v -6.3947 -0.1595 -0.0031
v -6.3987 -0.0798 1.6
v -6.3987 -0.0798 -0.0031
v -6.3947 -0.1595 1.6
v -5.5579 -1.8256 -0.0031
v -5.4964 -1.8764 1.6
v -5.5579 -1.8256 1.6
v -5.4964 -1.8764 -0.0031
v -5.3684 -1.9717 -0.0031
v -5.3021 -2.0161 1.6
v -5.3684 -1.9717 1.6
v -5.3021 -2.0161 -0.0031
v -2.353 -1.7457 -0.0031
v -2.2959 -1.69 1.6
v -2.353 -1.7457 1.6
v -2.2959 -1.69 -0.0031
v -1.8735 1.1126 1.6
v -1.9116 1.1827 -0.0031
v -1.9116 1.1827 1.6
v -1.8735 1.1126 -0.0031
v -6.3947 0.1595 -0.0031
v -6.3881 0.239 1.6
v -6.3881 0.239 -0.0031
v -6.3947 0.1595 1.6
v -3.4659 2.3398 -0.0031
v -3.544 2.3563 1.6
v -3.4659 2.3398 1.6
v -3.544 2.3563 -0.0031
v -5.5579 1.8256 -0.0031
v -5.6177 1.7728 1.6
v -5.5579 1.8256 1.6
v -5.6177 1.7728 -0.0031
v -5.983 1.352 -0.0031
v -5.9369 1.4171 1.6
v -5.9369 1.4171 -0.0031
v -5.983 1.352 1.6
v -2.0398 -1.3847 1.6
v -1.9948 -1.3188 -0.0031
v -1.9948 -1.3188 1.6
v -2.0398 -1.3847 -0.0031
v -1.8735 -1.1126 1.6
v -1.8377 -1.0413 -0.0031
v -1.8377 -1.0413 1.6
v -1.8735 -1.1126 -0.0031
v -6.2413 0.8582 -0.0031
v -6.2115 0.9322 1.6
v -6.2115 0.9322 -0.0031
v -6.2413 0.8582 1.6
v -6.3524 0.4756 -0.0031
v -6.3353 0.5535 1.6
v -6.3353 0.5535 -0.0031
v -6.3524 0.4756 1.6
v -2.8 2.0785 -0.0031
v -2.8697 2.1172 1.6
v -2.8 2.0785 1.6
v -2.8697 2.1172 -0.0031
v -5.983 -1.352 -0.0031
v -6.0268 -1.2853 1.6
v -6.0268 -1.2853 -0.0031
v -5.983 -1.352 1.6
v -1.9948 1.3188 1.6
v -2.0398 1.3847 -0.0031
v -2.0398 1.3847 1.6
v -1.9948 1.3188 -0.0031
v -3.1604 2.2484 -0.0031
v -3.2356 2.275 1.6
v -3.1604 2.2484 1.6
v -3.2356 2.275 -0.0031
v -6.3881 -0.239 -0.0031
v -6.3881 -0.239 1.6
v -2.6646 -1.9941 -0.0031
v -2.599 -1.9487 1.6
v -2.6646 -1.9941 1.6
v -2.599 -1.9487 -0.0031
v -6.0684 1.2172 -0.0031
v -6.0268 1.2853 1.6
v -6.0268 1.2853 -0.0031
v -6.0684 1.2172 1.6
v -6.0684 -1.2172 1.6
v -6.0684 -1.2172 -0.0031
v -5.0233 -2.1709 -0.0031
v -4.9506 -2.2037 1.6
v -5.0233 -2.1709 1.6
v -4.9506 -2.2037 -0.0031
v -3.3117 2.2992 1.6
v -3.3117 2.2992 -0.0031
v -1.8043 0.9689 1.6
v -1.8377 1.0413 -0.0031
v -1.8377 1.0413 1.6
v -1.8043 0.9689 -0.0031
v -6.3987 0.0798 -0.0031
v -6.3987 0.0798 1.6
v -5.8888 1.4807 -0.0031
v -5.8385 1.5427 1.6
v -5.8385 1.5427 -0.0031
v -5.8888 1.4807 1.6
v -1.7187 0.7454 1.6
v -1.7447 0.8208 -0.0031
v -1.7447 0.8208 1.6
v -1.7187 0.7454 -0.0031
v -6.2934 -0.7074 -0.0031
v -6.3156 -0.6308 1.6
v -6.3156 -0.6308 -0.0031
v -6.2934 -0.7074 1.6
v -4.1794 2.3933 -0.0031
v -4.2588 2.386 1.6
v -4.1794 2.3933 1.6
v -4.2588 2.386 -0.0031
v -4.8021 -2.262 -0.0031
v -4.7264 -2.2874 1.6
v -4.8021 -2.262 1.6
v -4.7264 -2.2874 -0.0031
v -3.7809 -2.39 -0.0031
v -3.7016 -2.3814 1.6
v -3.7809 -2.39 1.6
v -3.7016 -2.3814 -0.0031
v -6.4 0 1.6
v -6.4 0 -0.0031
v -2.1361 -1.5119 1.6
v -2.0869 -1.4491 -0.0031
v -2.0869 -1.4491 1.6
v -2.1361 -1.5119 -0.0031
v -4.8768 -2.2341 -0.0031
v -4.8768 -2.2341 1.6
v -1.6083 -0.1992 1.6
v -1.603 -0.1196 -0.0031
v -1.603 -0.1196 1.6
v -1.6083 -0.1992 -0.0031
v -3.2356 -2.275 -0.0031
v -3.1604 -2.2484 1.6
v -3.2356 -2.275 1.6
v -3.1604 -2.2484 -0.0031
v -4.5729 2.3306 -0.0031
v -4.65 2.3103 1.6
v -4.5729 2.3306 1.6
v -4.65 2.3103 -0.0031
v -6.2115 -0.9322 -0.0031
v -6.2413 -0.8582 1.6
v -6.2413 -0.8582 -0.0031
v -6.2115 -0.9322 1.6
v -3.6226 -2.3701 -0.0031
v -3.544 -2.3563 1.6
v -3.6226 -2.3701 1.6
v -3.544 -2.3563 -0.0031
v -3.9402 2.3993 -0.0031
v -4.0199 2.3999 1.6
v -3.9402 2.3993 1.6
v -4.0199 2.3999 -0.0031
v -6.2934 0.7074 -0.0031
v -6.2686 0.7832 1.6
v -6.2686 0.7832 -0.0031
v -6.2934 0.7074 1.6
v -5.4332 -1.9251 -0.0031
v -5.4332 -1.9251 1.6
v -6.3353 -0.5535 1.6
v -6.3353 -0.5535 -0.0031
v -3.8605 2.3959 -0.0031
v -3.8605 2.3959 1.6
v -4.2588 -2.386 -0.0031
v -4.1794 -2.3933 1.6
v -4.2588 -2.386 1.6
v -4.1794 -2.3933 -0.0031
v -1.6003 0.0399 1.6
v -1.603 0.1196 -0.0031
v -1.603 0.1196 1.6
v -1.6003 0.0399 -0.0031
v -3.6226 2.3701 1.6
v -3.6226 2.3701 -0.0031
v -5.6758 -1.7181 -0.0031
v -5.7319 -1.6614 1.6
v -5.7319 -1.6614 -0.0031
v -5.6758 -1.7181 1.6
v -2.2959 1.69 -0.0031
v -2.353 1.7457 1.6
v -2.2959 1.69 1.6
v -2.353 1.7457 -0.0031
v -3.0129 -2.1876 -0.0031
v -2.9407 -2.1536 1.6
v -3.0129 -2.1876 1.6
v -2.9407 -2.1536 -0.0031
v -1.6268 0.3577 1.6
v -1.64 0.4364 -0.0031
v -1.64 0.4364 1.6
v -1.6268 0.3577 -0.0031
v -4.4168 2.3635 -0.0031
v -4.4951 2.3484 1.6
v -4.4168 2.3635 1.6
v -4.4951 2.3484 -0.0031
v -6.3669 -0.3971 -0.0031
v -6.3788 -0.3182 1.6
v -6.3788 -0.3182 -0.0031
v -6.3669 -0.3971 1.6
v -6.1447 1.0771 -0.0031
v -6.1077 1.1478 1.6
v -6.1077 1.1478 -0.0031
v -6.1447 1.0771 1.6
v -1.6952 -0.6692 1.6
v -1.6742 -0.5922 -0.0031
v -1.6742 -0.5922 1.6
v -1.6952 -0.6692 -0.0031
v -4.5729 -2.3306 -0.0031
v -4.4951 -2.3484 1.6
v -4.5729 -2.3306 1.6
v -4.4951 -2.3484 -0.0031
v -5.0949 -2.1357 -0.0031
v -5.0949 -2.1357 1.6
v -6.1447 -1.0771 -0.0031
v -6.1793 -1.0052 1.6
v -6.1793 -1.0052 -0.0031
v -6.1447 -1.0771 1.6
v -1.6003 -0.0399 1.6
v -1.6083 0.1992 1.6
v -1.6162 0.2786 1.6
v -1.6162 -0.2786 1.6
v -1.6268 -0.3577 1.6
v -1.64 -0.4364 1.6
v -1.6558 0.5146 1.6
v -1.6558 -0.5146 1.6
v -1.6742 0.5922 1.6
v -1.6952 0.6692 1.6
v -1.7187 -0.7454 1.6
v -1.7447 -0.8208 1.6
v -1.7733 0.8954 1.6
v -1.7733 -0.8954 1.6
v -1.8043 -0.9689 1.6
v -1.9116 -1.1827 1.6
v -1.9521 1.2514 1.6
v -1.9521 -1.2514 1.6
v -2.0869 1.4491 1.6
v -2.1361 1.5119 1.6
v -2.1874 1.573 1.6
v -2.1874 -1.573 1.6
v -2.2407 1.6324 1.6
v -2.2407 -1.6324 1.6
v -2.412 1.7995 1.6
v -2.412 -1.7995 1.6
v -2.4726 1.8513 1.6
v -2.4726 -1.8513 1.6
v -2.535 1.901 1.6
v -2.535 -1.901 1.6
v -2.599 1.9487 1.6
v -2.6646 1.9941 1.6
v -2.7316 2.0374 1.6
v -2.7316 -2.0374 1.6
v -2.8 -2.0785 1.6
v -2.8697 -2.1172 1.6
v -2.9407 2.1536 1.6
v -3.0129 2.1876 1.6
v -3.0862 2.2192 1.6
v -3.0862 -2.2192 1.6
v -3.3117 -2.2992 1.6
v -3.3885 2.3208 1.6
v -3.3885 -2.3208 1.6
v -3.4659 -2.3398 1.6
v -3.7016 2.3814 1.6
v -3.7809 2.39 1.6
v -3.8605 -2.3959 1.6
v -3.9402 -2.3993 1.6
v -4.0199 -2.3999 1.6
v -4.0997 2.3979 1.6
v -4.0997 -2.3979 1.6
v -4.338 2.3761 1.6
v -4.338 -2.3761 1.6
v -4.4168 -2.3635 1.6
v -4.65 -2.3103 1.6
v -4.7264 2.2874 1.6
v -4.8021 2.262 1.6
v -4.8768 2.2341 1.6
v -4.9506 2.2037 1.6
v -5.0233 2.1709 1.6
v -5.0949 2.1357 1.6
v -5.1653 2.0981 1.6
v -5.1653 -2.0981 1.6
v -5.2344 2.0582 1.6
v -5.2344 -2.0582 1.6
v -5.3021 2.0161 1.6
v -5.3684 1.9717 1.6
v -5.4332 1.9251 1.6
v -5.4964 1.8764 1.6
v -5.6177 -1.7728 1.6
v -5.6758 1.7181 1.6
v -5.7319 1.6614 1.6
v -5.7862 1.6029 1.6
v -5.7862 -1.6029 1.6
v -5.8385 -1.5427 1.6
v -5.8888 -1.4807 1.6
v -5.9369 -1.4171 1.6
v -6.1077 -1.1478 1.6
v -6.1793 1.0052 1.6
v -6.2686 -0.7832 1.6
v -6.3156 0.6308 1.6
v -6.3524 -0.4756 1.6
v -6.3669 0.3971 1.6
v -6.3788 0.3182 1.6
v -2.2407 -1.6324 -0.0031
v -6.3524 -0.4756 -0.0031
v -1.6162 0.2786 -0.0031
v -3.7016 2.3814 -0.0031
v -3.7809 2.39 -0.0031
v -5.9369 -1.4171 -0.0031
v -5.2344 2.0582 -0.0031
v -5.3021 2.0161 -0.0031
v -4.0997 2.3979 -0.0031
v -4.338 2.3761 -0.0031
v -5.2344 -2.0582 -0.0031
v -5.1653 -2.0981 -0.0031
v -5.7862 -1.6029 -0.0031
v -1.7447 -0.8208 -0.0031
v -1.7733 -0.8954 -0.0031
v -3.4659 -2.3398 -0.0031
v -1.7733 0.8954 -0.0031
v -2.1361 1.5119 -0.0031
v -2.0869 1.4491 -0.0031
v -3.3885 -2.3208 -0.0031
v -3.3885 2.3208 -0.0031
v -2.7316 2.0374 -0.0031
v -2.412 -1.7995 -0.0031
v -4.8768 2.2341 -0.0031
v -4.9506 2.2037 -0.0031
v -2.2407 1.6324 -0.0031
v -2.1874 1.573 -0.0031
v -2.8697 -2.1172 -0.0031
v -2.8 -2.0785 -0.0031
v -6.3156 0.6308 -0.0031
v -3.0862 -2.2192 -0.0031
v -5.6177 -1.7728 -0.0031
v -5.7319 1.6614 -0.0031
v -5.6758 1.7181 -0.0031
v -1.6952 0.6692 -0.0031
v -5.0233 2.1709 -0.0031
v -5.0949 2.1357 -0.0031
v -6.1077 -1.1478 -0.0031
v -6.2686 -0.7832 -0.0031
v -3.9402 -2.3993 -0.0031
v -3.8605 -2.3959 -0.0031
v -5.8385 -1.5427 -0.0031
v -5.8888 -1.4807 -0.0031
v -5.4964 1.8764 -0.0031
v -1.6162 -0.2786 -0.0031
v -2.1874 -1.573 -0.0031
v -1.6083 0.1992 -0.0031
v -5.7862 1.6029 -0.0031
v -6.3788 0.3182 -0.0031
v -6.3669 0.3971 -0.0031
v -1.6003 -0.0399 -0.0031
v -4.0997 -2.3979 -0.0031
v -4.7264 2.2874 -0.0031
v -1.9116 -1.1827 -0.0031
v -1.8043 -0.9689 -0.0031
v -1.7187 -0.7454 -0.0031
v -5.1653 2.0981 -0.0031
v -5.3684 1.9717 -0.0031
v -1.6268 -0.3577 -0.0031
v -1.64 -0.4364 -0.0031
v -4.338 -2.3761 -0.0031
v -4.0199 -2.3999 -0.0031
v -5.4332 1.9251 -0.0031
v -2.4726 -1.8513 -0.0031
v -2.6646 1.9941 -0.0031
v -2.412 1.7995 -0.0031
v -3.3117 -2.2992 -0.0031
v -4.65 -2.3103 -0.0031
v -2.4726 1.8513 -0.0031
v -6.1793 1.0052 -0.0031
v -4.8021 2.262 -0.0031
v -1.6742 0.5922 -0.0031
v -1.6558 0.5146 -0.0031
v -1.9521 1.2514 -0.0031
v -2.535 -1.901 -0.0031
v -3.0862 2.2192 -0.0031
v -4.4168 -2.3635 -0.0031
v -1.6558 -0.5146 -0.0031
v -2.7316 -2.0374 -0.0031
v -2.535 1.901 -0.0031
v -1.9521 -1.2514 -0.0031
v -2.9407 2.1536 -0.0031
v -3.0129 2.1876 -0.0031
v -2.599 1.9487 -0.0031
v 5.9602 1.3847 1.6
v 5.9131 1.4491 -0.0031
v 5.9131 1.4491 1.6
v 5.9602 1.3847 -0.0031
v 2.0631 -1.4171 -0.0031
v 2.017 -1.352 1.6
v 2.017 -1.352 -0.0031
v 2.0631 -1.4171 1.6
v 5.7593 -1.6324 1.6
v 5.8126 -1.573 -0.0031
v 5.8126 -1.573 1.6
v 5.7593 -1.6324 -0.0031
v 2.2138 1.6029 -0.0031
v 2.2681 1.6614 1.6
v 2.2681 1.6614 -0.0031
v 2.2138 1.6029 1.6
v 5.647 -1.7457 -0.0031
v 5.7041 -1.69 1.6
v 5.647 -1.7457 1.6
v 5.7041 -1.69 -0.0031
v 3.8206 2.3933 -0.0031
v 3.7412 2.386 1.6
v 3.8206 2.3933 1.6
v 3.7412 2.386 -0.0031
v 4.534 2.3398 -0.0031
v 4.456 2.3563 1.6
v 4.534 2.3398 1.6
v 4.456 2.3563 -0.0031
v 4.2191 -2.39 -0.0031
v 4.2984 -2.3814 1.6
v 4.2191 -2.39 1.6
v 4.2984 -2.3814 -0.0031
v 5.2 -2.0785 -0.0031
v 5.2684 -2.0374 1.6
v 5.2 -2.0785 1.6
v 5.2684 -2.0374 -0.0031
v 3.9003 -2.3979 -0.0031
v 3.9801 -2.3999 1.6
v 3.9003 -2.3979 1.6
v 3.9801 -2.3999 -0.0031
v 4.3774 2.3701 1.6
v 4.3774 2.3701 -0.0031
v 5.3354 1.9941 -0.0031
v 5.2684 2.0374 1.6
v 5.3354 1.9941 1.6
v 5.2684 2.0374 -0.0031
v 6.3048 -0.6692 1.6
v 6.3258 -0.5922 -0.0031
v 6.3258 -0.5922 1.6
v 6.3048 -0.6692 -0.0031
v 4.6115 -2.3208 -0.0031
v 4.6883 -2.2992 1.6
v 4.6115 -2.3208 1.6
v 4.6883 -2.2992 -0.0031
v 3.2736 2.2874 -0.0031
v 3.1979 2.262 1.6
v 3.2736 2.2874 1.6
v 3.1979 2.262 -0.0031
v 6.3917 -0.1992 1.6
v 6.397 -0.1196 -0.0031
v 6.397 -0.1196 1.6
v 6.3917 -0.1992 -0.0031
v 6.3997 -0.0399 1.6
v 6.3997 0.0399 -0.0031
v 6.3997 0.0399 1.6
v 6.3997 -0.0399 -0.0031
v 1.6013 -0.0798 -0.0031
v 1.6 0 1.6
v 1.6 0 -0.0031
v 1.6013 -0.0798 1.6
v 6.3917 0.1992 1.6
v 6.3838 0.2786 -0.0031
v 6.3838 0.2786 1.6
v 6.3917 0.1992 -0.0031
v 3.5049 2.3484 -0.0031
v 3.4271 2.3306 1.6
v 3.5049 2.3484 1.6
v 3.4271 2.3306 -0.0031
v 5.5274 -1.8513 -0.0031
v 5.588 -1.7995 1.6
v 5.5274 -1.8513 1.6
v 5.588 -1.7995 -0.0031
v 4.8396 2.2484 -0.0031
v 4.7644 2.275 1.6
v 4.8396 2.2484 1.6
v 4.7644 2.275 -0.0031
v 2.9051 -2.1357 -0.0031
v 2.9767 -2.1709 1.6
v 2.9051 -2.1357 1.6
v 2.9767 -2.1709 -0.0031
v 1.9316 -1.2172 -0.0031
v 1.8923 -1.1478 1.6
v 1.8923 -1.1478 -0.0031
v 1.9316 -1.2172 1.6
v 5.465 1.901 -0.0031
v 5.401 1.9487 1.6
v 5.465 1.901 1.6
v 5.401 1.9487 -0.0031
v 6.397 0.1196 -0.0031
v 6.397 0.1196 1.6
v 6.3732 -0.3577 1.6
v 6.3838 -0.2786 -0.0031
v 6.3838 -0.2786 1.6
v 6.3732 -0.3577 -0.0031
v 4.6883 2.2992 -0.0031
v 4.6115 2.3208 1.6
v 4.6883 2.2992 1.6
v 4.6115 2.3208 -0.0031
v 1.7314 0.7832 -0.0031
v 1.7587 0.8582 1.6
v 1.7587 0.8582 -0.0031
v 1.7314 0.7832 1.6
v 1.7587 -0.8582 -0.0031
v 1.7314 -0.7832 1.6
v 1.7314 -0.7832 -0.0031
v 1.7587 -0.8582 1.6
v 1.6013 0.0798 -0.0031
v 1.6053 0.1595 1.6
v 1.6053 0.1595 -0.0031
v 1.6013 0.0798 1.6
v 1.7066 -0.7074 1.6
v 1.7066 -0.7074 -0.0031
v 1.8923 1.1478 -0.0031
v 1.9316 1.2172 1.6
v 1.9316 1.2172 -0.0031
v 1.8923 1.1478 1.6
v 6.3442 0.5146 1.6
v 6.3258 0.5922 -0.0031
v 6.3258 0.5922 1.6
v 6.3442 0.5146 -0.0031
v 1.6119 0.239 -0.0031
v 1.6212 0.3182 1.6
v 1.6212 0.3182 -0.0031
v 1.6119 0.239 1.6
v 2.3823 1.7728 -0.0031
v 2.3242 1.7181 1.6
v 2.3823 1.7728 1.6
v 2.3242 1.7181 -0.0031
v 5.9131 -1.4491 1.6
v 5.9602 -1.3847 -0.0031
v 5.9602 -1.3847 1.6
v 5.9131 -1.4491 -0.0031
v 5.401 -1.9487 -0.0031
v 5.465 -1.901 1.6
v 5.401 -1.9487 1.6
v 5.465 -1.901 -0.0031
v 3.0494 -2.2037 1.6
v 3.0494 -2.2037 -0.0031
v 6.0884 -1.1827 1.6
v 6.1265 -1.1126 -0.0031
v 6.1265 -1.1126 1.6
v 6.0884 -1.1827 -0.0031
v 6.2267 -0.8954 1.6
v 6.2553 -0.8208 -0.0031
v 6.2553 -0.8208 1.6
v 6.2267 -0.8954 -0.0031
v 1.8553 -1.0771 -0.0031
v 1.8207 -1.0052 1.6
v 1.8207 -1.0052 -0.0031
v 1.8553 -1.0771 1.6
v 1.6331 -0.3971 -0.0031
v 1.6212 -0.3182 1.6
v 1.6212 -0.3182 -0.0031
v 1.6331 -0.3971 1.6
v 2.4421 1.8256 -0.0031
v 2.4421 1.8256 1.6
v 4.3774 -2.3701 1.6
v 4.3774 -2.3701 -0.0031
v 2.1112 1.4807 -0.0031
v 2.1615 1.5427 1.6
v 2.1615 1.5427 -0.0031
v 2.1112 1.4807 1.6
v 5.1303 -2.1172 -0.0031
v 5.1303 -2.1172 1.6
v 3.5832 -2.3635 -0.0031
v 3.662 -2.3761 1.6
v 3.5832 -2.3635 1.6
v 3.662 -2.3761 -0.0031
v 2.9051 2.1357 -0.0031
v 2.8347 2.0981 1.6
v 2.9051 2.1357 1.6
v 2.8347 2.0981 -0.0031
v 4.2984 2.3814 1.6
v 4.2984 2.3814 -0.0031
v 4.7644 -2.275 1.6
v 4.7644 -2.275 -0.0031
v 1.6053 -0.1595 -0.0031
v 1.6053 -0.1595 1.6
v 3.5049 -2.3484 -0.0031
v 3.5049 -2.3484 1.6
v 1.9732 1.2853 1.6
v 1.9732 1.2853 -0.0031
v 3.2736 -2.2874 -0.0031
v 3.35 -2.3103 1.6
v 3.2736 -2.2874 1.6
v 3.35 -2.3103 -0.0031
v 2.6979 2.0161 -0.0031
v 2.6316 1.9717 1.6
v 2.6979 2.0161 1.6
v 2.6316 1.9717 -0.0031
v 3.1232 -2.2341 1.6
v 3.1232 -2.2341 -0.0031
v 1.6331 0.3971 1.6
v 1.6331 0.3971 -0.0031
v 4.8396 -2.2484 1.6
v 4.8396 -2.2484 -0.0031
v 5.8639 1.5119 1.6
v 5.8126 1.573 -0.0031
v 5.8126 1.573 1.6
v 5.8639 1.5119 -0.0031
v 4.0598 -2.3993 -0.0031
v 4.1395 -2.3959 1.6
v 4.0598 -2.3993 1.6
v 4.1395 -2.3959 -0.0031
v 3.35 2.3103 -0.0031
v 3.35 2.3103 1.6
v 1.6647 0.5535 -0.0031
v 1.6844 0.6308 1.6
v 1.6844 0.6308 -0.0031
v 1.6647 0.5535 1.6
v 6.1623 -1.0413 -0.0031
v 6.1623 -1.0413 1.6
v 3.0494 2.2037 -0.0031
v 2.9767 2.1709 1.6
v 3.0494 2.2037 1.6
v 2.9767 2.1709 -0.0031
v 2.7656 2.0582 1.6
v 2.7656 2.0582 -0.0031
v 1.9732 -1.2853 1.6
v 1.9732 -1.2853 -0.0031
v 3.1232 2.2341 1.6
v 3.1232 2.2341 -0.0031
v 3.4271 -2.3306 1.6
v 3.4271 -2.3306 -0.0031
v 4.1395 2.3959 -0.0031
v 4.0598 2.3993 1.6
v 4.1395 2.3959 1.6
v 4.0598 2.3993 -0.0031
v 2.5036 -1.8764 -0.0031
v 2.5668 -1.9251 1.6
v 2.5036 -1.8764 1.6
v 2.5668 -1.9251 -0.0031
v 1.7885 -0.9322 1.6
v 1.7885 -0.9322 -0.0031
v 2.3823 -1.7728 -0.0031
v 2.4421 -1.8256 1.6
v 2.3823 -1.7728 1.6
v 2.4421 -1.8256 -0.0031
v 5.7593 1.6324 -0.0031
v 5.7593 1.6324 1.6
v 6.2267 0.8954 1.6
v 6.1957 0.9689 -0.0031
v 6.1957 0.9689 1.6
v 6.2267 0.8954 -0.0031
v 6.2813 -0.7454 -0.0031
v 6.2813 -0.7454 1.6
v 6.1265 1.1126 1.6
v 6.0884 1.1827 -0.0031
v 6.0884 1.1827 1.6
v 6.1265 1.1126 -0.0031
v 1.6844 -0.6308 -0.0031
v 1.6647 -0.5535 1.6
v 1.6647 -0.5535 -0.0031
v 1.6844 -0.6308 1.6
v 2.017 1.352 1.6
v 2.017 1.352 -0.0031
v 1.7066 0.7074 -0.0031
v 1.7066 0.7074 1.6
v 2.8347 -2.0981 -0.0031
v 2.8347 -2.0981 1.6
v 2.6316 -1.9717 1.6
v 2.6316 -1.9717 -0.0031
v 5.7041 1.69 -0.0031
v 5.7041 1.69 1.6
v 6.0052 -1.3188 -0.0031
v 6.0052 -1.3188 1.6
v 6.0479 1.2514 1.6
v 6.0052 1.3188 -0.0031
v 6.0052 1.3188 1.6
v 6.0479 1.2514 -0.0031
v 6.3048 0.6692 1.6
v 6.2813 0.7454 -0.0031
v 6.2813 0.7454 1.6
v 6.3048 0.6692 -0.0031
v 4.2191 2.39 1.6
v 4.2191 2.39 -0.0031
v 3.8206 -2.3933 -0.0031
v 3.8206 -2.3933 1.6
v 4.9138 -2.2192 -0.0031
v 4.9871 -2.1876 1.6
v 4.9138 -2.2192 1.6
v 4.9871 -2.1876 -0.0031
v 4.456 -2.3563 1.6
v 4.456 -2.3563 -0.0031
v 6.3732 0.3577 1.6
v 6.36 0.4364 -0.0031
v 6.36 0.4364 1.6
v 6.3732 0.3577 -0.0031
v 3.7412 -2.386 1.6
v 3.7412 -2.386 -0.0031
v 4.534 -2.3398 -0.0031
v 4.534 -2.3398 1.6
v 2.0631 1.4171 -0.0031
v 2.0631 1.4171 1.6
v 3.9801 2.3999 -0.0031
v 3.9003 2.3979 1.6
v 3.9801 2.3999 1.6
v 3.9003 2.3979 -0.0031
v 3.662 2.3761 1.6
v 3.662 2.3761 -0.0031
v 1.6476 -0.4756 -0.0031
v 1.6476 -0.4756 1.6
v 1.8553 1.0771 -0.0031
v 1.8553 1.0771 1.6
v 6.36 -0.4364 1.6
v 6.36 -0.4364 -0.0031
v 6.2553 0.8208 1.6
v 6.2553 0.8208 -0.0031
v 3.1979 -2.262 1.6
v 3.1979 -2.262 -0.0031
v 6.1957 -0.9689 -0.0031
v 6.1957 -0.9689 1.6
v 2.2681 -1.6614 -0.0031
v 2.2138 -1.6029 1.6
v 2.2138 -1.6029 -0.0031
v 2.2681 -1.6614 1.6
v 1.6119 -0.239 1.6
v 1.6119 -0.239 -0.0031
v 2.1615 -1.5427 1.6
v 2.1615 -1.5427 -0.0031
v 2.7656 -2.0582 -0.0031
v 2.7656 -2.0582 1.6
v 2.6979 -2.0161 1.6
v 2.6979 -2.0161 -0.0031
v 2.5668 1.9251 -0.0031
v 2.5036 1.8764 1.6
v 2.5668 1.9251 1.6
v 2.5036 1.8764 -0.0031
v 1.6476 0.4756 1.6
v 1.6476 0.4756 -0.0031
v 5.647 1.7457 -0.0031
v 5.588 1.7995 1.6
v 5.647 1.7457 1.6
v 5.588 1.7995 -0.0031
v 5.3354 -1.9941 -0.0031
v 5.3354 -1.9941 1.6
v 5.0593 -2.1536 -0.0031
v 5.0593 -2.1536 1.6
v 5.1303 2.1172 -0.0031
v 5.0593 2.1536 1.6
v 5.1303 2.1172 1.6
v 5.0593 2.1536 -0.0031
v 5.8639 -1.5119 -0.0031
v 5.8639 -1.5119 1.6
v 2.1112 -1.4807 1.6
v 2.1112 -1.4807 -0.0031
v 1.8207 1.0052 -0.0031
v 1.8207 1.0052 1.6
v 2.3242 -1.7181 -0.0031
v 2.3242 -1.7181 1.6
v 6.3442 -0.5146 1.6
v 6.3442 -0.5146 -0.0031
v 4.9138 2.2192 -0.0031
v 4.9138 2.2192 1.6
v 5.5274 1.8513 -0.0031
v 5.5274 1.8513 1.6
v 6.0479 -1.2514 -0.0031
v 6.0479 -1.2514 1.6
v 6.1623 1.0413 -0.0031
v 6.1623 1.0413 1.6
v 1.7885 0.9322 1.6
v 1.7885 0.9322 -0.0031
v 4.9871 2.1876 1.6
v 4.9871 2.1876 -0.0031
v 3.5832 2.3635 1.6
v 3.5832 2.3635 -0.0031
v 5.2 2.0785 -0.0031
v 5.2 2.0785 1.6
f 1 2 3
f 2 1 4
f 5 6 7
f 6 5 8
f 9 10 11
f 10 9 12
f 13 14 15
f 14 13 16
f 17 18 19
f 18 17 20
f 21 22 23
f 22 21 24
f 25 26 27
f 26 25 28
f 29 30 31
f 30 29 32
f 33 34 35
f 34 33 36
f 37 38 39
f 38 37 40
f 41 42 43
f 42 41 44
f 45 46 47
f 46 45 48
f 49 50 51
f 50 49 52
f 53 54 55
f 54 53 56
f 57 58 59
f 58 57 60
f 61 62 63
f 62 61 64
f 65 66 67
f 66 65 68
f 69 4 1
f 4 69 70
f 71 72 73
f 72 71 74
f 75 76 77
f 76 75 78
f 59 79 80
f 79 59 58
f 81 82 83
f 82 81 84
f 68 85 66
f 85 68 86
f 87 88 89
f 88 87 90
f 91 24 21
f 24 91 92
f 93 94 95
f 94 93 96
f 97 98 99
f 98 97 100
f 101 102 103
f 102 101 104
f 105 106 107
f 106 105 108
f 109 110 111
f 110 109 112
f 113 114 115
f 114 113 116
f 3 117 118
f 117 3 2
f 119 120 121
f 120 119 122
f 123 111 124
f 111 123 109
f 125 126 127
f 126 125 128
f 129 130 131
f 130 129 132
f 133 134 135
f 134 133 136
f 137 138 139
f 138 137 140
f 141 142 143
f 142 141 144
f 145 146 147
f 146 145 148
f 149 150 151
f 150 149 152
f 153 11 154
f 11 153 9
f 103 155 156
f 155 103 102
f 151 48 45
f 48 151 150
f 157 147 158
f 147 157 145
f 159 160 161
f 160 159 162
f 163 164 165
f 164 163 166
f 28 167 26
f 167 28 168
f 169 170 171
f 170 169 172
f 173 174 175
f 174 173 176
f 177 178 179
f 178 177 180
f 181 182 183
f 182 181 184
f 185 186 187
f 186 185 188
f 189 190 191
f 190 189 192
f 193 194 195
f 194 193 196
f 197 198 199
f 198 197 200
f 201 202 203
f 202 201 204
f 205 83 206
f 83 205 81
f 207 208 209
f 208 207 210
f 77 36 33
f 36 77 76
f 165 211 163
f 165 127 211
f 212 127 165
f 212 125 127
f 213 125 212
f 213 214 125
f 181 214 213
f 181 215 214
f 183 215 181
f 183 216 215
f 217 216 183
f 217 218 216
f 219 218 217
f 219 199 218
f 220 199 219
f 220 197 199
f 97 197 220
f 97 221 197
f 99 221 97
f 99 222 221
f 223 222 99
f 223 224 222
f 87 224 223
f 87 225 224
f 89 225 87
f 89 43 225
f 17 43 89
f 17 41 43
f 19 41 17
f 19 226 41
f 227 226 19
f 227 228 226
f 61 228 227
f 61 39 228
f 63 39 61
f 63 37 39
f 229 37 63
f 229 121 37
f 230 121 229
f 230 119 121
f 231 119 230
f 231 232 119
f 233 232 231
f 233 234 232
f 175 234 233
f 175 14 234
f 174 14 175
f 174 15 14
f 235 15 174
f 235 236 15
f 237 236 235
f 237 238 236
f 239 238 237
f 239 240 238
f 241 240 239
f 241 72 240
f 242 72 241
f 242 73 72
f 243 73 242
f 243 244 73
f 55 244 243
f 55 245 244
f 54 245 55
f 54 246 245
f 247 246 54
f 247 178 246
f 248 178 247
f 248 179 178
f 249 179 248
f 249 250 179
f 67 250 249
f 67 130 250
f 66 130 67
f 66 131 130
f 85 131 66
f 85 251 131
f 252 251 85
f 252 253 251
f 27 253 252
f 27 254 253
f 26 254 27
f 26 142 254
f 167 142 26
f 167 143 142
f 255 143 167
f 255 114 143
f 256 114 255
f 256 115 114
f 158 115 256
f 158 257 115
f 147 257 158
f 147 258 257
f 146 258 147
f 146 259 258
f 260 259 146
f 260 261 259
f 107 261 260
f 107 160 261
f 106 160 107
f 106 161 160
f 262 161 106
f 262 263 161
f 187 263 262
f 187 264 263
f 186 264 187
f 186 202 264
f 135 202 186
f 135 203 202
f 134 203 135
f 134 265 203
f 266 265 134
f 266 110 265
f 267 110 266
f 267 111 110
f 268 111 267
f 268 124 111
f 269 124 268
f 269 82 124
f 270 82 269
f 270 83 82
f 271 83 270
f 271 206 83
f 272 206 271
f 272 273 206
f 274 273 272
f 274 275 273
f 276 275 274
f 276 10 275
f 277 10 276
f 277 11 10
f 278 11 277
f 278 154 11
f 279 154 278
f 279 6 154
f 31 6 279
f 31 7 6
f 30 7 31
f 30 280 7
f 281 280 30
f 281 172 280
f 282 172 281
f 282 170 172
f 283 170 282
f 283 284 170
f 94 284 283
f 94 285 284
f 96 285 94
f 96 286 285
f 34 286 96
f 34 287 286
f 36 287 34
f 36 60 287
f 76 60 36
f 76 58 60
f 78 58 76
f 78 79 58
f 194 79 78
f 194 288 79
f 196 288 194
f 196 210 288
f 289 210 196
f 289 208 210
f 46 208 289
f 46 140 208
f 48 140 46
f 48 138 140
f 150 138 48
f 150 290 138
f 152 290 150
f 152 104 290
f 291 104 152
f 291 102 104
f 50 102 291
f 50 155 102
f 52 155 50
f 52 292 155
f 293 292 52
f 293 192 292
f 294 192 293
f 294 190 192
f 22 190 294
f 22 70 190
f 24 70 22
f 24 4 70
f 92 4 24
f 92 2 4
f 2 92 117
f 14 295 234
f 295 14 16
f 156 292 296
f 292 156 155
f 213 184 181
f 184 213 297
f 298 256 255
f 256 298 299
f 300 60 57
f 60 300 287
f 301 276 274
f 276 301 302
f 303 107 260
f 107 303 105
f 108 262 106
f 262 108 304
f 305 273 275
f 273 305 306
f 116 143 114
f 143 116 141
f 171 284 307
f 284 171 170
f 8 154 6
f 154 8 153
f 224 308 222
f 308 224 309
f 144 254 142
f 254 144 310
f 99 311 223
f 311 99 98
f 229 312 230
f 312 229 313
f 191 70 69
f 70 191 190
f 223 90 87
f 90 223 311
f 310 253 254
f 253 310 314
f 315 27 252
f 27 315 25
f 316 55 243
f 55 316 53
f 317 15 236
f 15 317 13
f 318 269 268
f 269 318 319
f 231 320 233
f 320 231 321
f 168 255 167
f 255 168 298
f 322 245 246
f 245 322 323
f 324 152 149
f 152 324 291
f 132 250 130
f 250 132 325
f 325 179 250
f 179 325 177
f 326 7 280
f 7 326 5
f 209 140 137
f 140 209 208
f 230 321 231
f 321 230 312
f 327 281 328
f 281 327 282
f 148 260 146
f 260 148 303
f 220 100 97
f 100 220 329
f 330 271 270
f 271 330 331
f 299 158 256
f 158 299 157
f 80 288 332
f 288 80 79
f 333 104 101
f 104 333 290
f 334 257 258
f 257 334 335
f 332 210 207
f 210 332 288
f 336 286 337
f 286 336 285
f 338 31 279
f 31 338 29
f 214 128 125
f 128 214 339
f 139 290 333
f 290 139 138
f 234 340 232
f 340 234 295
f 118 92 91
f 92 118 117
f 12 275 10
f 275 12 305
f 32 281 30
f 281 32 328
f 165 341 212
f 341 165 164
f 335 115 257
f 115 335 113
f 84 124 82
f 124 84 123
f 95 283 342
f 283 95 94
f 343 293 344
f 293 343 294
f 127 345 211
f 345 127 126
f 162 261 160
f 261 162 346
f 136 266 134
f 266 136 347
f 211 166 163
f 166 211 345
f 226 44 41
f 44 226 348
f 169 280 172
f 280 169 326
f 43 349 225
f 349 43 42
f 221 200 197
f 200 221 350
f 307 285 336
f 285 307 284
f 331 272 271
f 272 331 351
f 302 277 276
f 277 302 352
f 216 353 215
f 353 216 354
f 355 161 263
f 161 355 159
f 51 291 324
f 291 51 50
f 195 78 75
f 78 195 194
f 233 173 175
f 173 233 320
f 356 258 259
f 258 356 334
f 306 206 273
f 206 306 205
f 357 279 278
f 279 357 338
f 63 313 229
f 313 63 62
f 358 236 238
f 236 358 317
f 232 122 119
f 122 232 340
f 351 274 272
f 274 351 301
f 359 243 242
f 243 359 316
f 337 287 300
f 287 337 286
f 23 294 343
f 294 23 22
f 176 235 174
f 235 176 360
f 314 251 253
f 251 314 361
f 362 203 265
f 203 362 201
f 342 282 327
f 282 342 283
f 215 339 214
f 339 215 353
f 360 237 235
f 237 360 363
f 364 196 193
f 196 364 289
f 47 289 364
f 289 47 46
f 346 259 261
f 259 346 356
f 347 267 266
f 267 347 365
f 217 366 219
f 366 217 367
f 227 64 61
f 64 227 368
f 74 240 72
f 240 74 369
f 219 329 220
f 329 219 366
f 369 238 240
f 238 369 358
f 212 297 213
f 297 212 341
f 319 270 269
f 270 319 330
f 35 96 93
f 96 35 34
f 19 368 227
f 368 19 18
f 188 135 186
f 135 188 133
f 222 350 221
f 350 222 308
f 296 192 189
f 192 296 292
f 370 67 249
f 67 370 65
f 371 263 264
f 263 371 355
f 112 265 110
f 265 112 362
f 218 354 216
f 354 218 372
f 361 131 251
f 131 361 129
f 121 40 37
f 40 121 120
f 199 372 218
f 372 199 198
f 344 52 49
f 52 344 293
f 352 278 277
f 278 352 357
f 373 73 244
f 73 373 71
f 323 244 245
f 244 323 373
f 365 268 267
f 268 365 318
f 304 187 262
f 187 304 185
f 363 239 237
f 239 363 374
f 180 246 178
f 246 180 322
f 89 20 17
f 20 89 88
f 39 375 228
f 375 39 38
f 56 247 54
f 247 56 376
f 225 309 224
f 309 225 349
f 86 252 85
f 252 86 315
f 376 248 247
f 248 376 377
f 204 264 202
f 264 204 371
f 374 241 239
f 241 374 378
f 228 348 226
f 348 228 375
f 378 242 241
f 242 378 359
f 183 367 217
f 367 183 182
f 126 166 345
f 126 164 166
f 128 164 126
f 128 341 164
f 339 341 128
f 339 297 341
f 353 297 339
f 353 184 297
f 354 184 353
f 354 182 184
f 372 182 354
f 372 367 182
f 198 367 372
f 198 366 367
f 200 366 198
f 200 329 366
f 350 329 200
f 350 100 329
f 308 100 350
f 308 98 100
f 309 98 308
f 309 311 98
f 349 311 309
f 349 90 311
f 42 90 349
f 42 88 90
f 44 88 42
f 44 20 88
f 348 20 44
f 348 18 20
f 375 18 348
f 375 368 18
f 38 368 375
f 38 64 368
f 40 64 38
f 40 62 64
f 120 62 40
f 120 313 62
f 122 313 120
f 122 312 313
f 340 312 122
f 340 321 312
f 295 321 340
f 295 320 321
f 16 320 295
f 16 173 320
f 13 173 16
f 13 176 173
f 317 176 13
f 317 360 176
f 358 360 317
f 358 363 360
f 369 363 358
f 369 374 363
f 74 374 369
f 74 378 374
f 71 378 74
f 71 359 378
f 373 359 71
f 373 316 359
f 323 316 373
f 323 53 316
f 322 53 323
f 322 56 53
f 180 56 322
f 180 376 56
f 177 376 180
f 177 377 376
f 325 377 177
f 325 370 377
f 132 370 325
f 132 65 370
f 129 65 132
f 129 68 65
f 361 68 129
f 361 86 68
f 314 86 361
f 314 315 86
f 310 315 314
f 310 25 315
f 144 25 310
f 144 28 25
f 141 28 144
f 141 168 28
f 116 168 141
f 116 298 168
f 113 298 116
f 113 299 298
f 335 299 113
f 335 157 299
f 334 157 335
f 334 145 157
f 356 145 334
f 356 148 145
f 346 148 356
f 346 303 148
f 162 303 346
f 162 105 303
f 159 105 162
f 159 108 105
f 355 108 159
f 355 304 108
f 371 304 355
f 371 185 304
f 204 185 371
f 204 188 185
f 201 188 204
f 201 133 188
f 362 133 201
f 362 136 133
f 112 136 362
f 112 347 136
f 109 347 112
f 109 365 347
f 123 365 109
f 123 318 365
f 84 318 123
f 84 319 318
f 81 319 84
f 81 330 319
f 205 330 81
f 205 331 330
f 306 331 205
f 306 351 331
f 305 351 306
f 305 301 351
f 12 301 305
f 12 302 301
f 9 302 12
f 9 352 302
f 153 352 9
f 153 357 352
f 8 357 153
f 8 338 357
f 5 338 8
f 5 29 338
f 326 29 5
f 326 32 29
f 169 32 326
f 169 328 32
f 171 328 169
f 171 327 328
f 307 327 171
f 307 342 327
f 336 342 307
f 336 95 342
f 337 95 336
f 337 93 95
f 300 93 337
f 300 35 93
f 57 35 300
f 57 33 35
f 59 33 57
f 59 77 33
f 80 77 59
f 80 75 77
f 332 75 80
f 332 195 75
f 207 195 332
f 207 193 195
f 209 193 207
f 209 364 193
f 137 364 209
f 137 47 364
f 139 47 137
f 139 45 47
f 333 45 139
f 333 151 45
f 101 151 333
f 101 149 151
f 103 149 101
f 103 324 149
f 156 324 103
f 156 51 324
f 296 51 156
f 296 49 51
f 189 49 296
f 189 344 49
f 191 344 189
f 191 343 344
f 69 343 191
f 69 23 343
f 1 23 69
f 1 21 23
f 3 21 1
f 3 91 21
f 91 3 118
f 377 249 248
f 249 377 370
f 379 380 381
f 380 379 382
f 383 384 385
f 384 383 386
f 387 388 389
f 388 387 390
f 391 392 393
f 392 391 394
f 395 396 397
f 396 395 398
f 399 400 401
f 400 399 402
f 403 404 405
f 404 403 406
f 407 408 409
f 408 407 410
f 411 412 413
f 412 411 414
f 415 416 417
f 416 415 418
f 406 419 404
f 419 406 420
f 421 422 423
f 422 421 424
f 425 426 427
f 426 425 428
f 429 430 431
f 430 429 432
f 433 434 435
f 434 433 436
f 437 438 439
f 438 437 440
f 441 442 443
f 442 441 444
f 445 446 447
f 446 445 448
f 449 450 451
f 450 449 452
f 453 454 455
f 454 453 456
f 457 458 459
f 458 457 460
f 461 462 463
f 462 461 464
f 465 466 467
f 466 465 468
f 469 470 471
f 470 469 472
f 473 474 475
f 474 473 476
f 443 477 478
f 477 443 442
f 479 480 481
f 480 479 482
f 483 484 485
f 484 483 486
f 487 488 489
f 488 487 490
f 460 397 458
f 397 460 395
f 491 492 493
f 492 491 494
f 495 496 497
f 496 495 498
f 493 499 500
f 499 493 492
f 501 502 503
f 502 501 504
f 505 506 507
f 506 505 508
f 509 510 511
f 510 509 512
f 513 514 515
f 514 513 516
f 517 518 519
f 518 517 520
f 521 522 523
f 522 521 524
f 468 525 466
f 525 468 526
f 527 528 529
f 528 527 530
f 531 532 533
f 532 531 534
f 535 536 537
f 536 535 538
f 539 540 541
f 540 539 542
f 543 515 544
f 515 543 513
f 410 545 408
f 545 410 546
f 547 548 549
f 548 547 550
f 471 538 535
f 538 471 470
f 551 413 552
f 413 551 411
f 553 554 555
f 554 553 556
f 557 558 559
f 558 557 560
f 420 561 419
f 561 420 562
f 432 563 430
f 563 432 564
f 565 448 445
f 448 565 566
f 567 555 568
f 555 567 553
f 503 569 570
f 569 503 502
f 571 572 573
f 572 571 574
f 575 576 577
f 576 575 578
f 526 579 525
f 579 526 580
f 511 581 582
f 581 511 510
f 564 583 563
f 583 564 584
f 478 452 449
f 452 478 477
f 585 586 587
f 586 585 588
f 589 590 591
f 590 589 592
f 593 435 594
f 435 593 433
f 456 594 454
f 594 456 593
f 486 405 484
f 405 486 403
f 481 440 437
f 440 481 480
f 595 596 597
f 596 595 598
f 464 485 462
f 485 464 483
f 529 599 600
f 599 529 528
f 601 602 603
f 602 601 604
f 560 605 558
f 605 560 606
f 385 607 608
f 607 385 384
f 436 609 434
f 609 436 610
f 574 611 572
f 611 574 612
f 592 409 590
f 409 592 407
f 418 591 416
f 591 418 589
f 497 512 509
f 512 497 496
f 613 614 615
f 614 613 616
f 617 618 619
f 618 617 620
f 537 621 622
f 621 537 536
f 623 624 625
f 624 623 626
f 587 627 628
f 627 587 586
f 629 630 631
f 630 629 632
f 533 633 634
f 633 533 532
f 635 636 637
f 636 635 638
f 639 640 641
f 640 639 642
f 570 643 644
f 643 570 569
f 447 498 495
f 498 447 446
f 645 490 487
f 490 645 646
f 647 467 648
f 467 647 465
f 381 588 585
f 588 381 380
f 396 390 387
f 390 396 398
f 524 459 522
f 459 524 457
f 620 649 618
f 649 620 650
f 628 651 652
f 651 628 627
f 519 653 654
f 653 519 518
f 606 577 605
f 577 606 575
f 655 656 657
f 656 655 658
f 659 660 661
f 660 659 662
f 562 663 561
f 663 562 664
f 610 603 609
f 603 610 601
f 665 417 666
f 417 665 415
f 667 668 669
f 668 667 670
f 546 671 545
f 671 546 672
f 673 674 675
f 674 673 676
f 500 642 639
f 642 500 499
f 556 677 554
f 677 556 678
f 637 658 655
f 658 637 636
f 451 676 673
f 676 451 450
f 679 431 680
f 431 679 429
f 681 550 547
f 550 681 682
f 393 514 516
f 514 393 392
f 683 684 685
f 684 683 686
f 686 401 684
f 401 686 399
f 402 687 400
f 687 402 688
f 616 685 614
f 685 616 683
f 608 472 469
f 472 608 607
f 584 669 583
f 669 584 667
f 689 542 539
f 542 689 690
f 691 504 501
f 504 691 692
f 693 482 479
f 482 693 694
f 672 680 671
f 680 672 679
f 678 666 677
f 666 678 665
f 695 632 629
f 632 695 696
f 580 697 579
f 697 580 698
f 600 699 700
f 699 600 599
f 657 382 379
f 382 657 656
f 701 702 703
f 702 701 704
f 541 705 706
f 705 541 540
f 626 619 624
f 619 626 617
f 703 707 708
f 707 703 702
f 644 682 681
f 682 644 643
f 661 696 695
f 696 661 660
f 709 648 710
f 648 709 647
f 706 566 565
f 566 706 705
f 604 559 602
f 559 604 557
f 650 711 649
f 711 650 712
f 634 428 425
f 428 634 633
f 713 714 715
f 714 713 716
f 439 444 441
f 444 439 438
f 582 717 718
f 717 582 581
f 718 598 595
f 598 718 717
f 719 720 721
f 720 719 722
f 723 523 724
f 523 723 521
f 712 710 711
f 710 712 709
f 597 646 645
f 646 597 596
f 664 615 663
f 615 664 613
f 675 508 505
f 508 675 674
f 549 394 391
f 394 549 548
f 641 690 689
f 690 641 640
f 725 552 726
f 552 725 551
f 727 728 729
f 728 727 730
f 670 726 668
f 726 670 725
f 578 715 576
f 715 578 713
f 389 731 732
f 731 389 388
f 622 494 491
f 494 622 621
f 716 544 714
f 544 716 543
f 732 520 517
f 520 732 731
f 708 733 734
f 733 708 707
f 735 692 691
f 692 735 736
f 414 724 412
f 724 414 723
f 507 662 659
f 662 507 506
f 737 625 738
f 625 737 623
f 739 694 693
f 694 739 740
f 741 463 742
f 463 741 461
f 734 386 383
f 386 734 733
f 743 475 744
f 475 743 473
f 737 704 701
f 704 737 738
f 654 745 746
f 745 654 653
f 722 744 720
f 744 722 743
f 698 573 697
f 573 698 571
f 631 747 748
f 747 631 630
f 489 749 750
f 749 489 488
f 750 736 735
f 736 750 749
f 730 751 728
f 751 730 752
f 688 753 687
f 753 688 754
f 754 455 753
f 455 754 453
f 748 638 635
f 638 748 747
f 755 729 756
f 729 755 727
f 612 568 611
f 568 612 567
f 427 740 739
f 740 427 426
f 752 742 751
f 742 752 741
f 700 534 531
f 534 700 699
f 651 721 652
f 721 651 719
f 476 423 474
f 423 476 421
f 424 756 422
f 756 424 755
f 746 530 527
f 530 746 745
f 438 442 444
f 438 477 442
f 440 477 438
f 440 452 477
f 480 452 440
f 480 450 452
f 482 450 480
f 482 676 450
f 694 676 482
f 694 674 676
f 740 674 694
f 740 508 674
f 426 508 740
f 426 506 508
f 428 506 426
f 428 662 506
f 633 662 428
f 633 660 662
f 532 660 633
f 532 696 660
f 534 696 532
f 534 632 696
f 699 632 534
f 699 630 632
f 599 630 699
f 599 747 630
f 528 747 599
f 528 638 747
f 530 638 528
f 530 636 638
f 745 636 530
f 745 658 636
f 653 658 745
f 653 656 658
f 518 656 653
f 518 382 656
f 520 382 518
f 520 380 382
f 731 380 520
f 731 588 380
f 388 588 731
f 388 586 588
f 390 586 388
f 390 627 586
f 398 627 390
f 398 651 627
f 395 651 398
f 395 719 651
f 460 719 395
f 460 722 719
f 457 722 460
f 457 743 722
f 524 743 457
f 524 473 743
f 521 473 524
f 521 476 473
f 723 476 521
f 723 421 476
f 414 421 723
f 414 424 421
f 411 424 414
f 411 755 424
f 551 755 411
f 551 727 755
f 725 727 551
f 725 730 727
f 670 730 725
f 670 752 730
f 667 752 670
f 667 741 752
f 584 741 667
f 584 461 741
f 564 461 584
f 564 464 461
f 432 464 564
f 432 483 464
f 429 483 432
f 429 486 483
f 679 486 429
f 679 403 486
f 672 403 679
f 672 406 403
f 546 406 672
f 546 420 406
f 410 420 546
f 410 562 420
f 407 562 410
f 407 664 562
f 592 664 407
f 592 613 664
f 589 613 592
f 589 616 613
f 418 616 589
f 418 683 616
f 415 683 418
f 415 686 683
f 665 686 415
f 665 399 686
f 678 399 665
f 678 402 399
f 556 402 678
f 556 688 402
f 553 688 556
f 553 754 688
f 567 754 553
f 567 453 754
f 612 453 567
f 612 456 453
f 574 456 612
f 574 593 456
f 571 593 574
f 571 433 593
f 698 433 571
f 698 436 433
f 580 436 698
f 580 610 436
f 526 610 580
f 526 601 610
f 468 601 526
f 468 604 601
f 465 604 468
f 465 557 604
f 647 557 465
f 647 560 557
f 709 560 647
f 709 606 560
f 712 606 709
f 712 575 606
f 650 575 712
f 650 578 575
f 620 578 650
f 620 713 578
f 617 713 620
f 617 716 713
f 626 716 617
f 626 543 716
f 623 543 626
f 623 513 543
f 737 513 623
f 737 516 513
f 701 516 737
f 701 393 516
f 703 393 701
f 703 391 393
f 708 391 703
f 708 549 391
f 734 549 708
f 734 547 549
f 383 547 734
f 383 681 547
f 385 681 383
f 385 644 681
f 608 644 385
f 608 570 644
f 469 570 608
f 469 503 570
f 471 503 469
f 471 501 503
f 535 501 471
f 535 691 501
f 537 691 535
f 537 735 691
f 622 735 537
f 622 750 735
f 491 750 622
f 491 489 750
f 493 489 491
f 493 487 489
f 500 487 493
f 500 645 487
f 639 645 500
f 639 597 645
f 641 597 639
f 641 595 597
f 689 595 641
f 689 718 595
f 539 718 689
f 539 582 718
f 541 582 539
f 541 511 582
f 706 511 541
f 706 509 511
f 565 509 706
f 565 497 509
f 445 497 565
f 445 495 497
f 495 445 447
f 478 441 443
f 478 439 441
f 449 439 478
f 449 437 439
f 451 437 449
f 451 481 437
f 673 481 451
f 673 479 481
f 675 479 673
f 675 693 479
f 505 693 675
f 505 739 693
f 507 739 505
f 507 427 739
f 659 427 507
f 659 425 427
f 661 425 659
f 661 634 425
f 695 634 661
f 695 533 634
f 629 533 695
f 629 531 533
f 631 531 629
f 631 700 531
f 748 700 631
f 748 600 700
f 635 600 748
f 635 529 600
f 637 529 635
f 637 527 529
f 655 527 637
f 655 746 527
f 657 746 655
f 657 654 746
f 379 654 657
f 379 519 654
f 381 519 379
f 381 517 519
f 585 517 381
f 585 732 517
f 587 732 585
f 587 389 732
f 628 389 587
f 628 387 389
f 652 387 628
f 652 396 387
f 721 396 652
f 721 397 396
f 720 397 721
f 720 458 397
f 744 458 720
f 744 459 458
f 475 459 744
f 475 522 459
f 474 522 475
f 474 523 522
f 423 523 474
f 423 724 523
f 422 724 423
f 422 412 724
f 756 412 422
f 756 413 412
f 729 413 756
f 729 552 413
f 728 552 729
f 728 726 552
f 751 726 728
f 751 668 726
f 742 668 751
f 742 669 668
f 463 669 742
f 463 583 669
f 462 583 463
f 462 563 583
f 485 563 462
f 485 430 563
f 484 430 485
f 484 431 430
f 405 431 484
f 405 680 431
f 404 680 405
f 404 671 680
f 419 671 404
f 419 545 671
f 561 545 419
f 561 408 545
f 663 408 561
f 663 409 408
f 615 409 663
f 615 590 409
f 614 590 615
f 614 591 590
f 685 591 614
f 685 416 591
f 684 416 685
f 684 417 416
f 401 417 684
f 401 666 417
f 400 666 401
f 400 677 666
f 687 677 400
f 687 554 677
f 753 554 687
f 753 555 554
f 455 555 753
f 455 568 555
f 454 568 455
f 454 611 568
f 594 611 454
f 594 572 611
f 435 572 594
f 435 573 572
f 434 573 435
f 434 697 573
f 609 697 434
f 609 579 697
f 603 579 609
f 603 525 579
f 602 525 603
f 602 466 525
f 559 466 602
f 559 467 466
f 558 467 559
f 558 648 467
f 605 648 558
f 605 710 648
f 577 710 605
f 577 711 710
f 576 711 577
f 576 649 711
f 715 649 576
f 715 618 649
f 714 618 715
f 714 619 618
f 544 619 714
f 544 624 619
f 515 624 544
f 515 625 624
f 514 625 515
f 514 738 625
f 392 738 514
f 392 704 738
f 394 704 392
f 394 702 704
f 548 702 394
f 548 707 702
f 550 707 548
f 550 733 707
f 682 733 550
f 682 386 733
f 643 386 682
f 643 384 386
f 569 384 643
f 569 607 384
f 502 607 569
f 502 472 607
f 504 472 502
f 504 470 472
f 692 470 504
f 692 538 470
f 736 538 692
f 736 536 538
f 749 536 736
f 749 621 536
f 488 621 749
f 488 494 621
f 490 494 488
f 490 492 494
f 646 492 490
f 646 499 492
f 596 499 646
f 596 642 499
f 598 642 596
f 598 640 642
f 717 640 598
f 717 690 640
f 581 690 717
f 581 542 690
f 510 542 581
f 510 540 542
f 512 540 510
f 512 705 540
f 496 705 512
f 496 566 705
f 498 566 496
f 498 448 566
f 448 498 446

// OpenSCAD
use <../lib.scad>
use <s/3004p90a.scad>
use <s/3004p90b.scad>
use <s/30363s01.scad>
$fa=1; $fs=0.2;
function ldraw_lib__30363p90(realsolid=false) = [
// 0 Slope Brick 18  4 x  2 with Classic Space Pattern
// 0 Name: 30363p90.dat
// 0 Author: Massimo Maso [Sirio]
// 0 !LDRAW_ORG Part UPDATE 2014-02
// 0 !LICENSE Licensed under CC BY 2.0 and CC BY 4.0 : see CAreadme.txt
// 
// 0 BFC CERTIFY CCW
  [0,"BFC","CERTIFY"],
  [0,"BFC","CCW"],
// 
// 0 !HISTORY 2014-12-23 [PTadmin] Official Update 2014-02
// 
// 
// 1 16 0 0 0 1 0 0 0 1 0 0 0 1 s\30363s01.dat
  [1,16,0,0,0,1,0,0,0,1,0,0,0,1, ldraw_lib__s__30363s01(realsolid)],
// 1 16 0 6.205 -28.616 1 0 0 0 0.316228 0.948684 0 -0.948684 0.316227 s\3004p90a.dat
  [1,16,0,6.205,-28.616,1,0,0,0,0.316228,0.948684,0,-0.948684,0.316227, ldraw_lib__s__3004p90a(realsolid)],
// 1 82 0 6.205 -28.616 1 0 0 0 0.316228 0.948684 0 -0.948684 0.316227 s\3004p90b.dat
  [1,82,0,6.205,-28.616,1,0,0,0,0.316228,0.948684,0,-0.948684,0.316227, ldraw_lib__s__3004p90b(realsolid)],
// 4 16 -20 6.205 -28.616 20 6.205 -28.616 20 0 -10 -20 0 -10
  [4,16,-20,6.205,-28.616,20,6.205,-28.616,20,0,-10,-20,0,-10],
// 4 16 -20 20 -70 20 20 -70 20 13.794 -51.384 -20 13.794 -51.384
  [4,16,-20,20,-70,20,20,-70,20,13.794,-51.384,-20,13.794,-51.384],
// 0
];
module ldraw_lib__30363p90(step=0, col=false, unit=2/5, alt=false, line=0.2, solid=!$preview)
    makepoly(ldraw_lib__30363p90(solid), step=step, col=col, unit=unit, alt=alt, line=line, solid=solid);
ldraw_lib__30363p90(line=0.2);
